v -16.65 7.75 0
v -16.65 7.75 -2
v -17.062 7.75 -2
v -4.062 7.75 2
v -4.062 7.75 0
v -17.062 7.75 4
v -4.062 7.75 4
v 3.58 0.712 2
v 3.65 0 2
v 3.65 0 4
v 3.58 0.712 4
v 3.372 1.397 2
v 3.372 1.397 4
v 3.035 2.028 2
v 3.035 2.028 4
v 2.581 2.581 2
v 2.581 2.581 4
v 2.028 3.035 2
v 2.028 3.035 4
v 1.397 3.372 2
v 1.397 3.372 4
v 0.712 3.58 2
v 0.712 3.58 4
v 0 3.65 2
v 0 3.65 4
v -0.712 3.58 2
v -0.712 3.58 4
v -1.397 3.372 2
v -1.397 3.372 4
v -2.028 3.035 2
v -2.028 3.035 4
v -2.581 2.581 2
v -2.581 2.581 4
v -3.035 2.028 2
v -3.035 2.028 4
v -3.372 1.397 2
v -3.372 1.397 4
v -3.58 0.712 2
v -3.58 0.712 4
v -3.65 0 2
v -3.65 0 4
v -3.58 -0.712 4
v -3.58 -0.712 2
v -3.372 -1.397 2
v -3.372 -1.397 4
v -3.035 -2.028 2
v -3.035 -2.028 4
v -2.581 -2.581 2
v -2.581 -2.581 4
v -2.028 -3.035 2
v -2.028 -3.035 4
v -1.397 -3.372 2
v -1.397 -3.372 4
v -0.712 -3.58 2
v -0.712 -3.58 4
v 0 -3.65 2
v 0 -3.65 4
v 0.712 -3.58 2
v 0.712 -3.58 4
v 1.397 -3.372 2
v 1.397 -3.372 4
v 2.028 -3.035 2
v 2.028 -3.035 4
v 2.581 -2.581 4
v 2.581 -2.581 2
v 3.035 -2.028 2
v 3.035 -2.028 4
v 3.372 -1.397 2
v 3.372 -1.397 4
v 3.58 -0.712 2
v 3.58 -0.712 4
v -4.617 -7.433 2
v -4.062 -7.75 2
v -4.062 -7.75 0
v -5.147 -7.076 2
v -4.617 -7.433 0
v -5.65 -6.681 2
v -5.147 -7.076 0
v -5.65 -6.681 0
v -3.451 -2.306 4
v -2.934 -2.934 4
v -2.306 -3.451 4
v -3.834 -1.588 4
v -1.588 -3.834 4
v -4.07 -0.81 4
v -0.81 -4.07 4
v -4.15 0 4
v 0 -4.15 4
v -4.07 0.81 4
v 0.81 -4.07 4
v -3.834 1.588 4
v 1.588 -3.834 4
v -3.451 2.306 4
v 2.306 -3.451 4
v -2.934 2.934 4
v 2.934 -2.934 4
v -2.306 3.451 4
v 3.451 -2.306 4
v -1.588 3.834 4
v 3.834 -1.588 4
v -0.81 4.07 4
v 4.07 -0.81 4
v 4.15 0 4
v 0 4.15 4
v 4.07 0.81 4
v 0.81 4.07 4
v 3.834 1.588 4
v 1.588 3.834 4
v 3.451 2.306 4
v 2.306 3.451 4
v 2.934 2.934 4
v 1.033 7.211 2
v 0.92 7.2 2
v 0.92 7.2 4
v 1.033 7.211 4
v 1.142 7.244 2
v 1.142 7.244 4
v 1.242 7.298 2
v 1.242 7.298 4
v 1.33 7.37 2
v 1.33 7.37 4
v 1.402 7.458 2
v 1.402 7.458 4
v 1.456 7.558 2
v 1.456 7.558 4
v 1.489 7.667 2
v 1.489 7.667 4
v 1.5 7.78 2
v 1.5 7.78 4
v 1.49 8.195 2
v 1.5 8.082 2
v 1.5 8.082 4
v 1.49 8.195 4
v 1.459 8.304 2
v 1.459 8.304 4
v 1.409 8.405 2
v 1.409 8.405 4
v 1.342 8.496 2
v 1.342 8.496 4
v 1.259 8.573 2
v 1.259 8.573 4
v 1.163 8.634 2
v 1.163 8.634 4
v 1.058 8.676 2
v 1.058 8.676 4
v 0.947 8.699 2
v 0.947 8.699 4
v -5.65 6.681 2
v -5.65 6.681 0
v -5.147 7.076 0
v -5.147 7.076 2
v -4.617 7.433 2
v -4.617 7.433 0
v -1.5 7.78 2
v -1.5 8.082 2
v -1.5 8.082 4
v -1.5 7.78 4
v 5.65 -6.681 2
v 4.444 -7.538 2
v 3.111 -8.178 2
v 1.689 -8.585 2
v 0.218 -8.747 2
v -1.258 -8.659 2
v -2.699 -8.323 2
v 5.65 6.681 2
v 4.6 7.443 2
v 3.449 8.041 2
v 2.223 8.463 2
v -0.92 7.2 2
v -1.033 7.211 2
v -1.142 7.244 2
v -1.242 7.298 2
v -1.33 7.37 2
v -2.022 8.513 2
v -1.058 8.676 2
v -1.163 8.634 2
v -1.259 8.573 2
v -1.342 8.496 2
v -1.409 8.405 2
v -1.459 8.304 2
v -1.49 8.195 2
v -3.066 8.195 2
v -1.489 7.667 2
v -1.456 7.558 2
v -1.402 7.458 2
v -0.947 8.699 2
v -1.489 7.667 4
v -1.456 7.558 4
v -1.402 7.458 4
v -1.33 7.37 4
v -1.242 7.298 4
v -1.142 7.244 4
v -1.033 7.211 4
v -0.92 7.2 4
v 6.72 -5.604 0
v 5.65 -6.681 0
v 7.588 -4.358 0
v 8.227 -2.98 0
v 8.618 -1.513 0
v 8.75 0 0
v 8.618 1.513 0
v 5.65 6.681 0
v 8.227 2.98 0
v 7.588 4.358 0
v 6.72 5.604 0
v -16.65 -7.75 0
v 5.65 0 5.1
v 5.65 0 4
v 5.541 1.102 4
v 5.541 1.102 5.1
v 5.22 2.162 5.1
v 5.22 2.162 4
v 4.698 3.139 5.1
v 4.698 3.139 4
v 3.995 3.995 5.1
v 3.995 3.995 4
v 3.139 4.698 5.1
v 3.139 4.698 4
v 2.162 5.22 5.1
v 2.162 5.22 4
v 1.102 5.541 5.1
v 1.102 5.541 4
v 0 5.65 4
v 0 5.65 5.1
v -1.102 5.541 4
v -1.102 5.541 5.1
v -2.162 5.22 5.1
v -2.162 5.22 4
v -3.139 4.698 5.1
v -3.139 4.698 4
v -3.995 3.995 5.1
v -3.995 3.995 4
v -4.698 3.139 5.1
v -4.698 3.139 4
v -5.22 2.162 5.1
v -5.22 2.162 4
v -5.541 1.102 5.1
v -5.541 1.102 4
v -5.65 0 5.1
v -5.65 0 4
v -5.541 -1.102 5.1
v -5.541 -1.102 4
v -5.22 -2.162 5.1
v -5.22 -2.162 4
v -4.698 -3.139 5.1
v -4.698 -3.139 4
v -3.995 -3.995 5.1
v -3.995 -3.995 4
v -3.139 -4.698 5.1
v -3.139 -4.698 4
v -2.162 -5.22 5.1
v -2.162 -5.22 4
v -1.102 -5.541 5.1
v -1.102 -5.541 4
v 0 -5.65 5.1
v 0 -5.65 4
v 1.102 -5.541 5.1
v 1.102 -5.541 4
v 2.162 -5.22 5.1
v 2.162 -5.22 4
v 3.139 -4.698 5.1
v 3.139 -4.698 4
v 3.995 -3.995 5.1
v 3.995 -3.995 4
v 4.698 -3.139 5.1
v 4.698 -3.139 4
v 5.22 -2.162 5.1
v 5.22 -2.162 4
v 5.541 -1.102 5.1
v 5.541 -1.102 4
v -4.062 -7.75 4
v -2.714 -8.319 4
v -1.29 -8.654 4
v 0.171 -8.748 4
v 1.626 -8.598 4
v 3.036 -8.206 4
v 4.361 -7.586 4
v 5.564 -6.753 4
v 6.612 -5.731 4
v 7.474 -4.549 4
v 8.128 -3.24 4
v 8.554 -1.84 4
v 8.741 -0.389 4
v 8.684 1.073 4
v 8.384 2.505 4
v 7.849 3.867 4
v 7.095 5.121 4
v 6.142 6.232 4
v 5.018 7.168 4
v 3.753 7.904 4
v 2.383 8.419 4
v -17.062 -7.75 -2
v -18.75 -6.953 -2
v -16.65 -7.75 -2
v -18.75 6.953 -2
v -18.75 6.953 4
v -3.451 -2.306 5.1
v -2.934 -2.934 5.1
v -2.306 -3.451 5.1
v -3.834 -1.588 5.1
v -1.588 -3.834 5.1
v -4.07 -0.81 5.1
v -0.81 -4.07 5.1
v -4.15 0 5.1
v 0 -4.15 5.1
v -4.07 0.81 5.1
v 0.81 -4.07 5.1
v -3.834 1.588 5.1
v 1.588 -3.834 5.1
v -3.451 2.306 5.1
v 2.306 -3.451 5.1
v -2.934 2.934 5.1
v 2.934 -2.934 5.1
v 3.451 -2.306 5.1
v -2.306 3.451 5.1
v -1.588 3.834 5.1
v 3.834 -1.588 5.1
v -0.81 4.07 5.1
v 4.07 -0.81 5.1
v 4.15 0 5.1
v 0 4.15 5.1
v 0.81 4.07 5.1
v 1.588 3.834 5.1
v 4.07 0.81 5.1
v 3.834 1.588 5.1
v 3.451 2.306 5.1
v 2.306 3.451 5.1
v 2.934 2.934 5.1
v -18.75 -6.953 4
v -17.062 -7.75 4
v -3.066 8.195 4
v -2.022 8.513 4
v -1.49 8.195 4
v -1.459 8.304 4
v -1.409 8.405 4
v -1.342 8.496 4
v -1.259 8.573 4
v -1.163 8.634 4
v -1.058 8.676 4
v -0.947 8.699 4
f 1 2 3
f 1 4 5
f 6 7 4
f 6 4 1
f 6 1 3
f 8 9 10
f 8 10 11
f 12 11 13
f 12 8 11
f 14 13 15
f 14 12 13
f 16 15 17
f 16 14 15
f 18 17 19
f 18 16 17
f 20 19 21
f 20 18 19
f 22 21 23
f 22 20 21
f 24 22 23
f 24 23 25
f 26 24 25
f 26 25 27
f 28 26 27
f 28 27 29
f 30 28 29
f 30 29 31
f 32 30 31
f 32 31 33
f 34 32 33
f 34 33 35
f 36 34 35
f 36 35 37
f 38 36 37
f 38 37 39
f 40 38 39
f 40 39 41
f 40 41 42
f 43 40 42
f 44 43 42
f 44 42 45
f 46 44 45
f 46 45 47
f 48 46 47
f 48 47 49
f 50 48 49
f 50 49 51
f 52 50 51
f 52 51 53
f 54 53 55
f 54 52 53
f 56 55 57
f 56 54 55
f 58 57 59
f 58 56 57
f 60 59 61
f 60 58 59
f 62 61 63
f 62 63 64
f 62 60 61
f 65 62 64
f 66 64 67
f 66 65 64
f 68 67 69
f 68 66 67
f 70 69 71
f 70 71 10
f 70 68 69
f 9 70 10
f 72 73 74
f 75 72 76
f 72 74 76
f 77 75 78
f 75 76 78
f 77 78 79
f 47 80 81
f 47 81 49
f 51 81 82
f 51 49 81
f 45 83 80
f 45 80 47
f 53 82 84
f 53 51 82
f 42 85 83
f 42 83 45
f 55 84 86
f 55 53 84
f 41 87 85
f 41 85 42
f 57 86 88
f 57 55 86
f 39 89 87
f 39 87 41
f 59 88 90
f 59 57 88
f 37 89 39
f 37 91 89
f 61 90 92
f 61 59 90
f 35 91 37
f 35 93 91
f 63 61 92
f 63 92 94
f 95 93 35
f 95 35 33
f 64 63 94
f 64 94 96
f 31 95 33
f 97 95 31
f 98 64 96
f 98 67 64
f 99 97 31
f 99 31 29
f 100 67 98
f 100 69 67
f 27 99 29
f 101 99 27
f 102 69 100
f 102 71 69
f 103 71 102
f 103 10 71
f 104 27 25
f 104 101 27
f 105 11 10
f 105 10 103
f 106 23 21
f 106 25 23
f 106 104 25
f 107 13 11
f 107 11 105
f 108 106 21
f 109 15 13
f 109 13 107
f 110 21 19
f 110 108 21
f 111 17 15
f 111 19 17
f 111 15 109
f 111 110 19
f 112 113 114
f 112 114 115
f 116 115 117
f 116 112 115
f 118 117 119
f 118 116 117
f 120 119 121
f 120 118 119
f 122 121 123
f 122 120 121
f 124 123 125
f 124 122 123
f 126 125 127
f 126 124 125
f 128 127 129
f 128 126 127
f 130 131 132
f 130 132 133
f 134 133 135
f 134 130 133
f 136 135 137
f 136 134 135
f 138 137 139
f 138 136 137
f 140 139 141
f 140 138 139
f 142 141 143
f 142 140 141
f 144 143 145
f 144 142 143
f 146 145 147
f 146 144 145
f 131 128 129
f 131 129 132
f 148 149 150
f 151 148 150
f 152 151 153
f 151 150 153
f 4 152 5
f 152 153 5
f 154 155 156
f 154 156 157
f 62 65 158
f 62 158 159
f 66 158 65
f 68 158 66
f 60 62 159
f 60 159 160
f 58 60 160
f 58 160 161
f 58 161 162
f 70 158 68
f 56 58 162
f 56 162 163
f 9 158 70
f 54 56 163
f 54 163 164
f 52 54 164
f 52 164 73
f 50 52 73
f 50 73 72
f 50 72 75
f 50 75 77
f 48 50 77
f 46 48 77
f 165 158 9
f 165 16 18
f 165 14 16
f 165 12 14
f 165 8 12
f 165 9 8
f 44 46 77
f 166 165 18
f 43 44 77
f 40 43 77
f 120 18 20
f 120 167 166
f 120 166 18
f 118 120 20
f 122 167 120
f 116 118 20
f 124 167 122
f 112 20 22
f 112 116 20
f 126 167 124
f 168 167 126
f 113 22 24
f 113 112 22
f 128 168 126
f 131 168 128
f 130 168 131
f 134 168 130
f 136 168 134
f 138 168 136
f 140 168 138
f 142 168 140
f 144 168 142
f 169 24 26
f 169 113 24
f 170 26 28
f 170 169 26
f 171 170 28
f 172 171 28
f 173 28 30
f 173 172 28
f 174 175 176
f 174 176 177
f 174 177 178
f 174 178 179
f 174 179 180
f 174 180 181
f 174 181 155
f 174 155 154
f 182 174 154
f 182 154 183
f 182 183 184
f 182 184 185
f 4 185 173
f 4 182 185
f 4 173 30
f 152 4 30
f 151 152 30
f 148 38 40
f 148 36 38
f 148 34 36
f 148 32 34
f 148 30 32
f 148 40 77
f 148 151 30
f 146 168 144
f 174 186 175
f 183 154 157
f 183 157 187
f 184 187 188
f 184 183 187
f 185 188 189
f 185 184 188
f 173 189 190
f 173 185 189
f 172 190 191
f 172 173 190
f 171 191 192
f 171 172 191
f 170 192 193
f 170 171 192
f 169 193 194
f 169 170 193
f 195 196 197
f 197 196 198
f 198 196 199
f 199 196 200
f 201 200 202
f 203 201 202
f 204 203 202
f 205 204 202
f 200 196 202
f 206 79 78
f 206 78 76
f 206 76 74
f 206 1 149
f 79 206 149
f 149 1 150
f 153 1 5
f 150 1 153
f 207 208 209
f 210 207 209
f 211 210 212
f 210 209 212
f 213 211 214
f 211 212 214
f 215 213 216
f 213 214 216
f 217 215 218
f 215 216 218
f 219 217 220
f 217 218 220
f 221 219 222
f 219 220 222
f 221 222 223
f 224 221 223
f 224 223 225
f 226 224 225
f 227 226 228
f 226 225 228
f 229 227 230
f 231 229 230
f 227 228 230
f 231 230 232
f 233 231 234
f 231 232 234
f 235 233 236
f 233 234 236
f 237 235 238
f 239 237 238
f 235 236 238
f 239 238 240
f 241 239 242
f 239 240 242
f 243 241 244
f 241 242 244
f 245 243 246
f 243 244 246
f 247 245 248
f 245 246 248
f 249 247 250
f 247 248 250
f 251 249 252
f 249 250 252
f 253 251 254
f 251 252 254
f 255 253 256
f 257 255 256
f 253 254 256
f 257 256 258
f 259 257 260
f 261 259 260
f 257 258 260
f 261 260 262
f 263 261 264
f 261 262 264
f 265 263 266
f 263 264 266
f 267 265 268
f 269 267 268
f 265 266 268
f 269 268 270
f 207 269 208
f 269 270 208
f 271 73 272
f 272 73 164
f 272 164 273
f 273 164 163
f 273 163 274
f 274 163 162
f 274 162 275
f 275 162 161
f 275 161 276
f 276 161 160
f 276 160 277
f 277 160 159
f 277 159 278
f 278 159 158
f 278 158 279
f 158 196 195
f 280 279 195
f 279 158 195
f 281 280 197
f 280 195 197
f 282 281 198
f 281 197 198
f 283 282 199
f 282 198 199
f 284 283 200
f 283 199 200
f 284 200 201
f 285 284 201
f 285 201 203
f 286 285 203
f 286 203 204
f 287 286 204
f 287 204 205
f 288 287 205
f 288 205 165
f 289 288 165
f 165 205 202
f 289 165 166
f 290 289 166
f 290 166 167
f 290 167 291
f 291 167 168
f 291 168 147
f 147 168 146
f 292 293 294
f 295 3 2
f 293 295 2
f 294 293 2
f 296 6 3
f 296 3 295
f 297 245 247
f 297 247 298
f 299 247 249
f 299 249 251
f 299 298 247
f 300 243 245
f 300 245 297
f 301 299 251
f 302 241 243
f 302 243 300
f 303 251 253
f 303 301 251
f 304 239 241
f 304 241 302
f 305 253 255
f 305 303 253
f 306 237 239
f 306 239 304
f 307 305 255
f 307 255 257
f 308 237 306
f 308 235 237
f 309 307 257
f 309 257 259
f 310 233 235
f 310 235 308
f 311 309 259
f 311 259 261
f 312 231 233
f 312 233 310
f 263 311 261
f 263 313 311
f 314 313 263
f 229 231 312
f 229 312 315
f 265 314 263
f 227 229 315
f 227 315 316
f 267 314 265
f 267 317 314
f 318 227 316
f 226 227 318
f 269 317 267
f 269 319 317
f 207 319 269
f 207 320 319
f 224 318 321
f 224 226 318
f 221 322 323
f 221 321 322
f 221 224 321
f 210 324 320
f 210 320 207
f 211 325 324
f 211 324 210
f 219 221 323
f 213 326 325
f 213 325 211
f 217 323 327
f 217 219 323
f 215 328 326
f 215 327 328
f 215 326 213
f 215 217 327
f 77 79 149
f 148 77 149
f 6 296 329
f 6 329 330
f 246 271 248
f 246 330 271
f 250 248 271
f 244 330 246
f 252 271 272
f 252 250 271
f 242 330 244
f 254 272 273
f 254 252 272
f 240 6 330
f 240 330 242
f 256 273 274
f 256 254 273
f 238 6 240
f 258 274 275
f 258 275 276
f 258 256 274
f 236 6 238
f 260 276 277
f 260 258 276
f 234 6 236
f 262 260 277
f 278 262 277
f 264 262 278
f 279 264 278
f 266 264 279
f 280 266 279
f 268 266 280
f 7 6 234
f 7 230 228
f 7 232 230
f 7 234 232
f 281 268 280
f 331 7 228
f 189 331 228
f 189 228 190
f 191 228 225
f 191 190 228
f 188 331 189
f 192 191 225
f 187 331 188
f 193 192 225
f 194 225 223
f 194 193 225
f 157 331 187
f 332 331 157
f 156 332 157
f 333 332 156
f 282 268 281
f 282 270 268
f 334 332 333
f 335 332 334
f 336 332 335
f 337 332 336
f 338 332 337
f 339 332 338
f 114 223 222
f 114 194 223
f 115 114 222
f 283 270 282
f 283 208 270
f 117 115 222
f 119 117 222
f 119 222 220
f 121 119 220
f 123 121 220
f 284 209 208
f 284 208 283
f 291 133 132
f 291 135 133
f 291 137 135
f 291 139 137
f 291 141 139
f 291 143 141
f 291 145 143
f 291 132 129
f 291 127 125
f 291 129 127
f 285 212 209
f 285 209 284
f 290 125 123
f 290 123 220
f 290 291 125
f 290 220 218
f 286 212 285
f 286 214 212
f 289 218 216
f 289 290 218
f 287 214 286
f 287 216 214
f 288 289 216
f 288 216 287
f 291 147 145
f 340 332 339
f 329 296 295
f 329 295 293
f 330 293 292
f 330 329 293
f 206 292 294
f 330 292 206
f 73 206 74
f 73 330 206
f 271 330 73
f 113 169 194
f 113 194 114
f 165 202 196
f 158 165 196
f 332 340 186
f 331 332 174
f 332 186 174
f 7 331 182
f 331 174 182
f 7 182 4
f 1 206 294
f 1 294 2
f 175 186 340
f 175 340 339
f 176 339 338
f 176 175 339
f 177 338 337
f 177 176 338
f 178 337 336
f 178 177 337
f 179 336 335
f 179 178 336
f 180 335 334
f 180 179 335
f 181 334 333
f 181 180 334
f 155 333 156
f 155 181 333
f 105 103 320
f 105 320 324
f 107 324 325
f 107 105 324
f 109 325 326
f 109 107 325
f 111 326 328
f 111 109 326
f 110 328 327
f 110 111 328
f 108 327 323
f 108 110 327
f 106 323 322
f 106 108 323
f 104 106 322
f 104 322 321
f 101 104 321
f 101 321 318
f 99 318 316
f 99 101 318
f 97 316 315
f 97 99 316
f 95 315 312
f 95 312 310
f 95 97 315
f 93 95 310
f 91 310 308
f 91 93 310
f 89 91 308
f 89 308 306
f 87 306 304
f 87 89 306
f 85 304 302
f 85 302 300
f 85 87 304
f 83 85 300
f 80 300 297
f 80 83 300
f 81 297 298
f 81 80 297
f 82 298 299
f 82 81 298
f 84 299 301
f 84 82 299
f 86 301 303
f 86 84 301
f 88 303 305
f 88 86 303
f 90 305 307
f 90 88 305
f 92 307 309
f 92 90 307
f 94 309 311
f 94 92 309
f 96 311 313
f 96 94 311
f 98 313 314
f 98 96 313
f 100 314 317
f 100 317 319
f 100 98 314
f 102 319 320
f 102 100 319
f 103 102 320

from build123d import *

# Parameters (mm, degrees)
SKETCH_310_R           = 3.65
EXTRUDE_1379_DEPTH     = 4
SKETCH_1_3_R           = 3.65
CUT_EXTRUDE_1435_DEPTH = 2
CUT_EXTRUDE_2054_DEPTH = 2
EXTRUDE_2114_DEPTH     = 2
SKETCH_4_R             = 5.65
SKETCH_4_R_2           = 4.15
EXTRUDE_4_DEPTH        = 1.1


with BuildPart() as part:
    # Sketch 310 → Extrude 1379 (new body)
    with BuildSketch(Plane.XY):
        with BuildLine():
            Line((-4.062019202, 7.75), (-17.062019202, 7.75))
            Line((-17.062019202, 7.75), (-18.75, 6.953209217))
            Line((-18.75, 6.953209217), (-18.75, -6.953209217))
            Line((-18.75, -6.953209217), (-17.062019202, -7.75))
            Line((-17.062019202, -7.75), (-4.062019202, -7.75))
            ThreePointArc((-4.062019202, -7.75), (8.75, 0), (-4.062019202, 7.75))
        make_face()
        Circle(SKETCH_310_R, mode=Mode.SUBTRACT)
    extrude(amount=EXTRUDE_1379_DEPTH)

    # Эскиз1<3> → Cut-Extrude 1435 (cut)
    with BuildSketch(Plane.XY):
        with BuildLine():
            Line((5.65, -6.681317235), (5.65, 6.681317235))
            ThreePointArc((5.65, 6.681317235), (0, 8.75), (-5.65, 6.681317235))
            Line((-5.65, 6.681317235), (-5.65, -6.681317235))
            ThreePointArc((-5.65, -6.681317235), (0, -8.75), (5.65, -6.681317235))
        make_face()
        Circle(SKETCH_1_3_R, mode=Mode.SUBTRACT)
    extrude(amount=CUT_EXTRUDE_1435_DEPTH, mode=Mode.SUBTRACT)

    # Sketch 1681 → Cut-Extrude 2054 (cut)
    with BuildSketch(Plane(origin=(0, 0, 2), x_dir=(-1, 0, 0), z_dir=(0, 0, -1))):
        with BuildLine():
            Line((-1.5, 7.78), (-1.5, 8.082233602))
            ThreePointArc((-1.5, 8.082233602), (-1.341523495, 8.496233679), (-0.947109471, 8.6985909))
            ThreePointArc((-0.947109471, 8.6985909), (0, 8.75), (0.947109471, 8.6985909))
            ThreePointArc((0.947109471, 8.6985909), (1.341523495, 8.496233679), (1.5, 8.082233602))
            Line((1.5, 8.082233602), (1.5, 7.78))
            ThreePointArc((1.5, 7.78), (1.330121933, 7.369878067), (0.92, 7.2))
            Line((0.92, 7.2), (-0.92, 7.2))
            ThreePointArc((-0.92, 7.2), (-1.330121933, 7.369878067), (-1.5, 7.78))
        make_face()
    extrude(amount=-CUT_EXTRUDE_2054_DEPTH, mode=Mode.SUBTRACT)

    # Эскиз1<5> → Extrude 2114 (add)
    with BuildSketch(Plane.XY):
        Polygon((-16.65, -7.75), (-16.65, 7.75), (-17.062019202, 7.75), (-18.75, 6.953209217), (-18.75, -6.953209217), (-17.062019202, -7.75), align=None)
    extrude(amount=-EXTRUDE_2114_DEPTH)

    # Эскиз4 → Бобышка-Вытянуть4 (add)
    with BuildSketch(Plane.XY.offset(4)):
        Circle(SKETCH_4_R)
        Circle(SKETCH_4_R_2, mode=Mode.SUBTRACT)
    extrude(amount=EXTRUDE_4_DEPTH)


solid = part.part
